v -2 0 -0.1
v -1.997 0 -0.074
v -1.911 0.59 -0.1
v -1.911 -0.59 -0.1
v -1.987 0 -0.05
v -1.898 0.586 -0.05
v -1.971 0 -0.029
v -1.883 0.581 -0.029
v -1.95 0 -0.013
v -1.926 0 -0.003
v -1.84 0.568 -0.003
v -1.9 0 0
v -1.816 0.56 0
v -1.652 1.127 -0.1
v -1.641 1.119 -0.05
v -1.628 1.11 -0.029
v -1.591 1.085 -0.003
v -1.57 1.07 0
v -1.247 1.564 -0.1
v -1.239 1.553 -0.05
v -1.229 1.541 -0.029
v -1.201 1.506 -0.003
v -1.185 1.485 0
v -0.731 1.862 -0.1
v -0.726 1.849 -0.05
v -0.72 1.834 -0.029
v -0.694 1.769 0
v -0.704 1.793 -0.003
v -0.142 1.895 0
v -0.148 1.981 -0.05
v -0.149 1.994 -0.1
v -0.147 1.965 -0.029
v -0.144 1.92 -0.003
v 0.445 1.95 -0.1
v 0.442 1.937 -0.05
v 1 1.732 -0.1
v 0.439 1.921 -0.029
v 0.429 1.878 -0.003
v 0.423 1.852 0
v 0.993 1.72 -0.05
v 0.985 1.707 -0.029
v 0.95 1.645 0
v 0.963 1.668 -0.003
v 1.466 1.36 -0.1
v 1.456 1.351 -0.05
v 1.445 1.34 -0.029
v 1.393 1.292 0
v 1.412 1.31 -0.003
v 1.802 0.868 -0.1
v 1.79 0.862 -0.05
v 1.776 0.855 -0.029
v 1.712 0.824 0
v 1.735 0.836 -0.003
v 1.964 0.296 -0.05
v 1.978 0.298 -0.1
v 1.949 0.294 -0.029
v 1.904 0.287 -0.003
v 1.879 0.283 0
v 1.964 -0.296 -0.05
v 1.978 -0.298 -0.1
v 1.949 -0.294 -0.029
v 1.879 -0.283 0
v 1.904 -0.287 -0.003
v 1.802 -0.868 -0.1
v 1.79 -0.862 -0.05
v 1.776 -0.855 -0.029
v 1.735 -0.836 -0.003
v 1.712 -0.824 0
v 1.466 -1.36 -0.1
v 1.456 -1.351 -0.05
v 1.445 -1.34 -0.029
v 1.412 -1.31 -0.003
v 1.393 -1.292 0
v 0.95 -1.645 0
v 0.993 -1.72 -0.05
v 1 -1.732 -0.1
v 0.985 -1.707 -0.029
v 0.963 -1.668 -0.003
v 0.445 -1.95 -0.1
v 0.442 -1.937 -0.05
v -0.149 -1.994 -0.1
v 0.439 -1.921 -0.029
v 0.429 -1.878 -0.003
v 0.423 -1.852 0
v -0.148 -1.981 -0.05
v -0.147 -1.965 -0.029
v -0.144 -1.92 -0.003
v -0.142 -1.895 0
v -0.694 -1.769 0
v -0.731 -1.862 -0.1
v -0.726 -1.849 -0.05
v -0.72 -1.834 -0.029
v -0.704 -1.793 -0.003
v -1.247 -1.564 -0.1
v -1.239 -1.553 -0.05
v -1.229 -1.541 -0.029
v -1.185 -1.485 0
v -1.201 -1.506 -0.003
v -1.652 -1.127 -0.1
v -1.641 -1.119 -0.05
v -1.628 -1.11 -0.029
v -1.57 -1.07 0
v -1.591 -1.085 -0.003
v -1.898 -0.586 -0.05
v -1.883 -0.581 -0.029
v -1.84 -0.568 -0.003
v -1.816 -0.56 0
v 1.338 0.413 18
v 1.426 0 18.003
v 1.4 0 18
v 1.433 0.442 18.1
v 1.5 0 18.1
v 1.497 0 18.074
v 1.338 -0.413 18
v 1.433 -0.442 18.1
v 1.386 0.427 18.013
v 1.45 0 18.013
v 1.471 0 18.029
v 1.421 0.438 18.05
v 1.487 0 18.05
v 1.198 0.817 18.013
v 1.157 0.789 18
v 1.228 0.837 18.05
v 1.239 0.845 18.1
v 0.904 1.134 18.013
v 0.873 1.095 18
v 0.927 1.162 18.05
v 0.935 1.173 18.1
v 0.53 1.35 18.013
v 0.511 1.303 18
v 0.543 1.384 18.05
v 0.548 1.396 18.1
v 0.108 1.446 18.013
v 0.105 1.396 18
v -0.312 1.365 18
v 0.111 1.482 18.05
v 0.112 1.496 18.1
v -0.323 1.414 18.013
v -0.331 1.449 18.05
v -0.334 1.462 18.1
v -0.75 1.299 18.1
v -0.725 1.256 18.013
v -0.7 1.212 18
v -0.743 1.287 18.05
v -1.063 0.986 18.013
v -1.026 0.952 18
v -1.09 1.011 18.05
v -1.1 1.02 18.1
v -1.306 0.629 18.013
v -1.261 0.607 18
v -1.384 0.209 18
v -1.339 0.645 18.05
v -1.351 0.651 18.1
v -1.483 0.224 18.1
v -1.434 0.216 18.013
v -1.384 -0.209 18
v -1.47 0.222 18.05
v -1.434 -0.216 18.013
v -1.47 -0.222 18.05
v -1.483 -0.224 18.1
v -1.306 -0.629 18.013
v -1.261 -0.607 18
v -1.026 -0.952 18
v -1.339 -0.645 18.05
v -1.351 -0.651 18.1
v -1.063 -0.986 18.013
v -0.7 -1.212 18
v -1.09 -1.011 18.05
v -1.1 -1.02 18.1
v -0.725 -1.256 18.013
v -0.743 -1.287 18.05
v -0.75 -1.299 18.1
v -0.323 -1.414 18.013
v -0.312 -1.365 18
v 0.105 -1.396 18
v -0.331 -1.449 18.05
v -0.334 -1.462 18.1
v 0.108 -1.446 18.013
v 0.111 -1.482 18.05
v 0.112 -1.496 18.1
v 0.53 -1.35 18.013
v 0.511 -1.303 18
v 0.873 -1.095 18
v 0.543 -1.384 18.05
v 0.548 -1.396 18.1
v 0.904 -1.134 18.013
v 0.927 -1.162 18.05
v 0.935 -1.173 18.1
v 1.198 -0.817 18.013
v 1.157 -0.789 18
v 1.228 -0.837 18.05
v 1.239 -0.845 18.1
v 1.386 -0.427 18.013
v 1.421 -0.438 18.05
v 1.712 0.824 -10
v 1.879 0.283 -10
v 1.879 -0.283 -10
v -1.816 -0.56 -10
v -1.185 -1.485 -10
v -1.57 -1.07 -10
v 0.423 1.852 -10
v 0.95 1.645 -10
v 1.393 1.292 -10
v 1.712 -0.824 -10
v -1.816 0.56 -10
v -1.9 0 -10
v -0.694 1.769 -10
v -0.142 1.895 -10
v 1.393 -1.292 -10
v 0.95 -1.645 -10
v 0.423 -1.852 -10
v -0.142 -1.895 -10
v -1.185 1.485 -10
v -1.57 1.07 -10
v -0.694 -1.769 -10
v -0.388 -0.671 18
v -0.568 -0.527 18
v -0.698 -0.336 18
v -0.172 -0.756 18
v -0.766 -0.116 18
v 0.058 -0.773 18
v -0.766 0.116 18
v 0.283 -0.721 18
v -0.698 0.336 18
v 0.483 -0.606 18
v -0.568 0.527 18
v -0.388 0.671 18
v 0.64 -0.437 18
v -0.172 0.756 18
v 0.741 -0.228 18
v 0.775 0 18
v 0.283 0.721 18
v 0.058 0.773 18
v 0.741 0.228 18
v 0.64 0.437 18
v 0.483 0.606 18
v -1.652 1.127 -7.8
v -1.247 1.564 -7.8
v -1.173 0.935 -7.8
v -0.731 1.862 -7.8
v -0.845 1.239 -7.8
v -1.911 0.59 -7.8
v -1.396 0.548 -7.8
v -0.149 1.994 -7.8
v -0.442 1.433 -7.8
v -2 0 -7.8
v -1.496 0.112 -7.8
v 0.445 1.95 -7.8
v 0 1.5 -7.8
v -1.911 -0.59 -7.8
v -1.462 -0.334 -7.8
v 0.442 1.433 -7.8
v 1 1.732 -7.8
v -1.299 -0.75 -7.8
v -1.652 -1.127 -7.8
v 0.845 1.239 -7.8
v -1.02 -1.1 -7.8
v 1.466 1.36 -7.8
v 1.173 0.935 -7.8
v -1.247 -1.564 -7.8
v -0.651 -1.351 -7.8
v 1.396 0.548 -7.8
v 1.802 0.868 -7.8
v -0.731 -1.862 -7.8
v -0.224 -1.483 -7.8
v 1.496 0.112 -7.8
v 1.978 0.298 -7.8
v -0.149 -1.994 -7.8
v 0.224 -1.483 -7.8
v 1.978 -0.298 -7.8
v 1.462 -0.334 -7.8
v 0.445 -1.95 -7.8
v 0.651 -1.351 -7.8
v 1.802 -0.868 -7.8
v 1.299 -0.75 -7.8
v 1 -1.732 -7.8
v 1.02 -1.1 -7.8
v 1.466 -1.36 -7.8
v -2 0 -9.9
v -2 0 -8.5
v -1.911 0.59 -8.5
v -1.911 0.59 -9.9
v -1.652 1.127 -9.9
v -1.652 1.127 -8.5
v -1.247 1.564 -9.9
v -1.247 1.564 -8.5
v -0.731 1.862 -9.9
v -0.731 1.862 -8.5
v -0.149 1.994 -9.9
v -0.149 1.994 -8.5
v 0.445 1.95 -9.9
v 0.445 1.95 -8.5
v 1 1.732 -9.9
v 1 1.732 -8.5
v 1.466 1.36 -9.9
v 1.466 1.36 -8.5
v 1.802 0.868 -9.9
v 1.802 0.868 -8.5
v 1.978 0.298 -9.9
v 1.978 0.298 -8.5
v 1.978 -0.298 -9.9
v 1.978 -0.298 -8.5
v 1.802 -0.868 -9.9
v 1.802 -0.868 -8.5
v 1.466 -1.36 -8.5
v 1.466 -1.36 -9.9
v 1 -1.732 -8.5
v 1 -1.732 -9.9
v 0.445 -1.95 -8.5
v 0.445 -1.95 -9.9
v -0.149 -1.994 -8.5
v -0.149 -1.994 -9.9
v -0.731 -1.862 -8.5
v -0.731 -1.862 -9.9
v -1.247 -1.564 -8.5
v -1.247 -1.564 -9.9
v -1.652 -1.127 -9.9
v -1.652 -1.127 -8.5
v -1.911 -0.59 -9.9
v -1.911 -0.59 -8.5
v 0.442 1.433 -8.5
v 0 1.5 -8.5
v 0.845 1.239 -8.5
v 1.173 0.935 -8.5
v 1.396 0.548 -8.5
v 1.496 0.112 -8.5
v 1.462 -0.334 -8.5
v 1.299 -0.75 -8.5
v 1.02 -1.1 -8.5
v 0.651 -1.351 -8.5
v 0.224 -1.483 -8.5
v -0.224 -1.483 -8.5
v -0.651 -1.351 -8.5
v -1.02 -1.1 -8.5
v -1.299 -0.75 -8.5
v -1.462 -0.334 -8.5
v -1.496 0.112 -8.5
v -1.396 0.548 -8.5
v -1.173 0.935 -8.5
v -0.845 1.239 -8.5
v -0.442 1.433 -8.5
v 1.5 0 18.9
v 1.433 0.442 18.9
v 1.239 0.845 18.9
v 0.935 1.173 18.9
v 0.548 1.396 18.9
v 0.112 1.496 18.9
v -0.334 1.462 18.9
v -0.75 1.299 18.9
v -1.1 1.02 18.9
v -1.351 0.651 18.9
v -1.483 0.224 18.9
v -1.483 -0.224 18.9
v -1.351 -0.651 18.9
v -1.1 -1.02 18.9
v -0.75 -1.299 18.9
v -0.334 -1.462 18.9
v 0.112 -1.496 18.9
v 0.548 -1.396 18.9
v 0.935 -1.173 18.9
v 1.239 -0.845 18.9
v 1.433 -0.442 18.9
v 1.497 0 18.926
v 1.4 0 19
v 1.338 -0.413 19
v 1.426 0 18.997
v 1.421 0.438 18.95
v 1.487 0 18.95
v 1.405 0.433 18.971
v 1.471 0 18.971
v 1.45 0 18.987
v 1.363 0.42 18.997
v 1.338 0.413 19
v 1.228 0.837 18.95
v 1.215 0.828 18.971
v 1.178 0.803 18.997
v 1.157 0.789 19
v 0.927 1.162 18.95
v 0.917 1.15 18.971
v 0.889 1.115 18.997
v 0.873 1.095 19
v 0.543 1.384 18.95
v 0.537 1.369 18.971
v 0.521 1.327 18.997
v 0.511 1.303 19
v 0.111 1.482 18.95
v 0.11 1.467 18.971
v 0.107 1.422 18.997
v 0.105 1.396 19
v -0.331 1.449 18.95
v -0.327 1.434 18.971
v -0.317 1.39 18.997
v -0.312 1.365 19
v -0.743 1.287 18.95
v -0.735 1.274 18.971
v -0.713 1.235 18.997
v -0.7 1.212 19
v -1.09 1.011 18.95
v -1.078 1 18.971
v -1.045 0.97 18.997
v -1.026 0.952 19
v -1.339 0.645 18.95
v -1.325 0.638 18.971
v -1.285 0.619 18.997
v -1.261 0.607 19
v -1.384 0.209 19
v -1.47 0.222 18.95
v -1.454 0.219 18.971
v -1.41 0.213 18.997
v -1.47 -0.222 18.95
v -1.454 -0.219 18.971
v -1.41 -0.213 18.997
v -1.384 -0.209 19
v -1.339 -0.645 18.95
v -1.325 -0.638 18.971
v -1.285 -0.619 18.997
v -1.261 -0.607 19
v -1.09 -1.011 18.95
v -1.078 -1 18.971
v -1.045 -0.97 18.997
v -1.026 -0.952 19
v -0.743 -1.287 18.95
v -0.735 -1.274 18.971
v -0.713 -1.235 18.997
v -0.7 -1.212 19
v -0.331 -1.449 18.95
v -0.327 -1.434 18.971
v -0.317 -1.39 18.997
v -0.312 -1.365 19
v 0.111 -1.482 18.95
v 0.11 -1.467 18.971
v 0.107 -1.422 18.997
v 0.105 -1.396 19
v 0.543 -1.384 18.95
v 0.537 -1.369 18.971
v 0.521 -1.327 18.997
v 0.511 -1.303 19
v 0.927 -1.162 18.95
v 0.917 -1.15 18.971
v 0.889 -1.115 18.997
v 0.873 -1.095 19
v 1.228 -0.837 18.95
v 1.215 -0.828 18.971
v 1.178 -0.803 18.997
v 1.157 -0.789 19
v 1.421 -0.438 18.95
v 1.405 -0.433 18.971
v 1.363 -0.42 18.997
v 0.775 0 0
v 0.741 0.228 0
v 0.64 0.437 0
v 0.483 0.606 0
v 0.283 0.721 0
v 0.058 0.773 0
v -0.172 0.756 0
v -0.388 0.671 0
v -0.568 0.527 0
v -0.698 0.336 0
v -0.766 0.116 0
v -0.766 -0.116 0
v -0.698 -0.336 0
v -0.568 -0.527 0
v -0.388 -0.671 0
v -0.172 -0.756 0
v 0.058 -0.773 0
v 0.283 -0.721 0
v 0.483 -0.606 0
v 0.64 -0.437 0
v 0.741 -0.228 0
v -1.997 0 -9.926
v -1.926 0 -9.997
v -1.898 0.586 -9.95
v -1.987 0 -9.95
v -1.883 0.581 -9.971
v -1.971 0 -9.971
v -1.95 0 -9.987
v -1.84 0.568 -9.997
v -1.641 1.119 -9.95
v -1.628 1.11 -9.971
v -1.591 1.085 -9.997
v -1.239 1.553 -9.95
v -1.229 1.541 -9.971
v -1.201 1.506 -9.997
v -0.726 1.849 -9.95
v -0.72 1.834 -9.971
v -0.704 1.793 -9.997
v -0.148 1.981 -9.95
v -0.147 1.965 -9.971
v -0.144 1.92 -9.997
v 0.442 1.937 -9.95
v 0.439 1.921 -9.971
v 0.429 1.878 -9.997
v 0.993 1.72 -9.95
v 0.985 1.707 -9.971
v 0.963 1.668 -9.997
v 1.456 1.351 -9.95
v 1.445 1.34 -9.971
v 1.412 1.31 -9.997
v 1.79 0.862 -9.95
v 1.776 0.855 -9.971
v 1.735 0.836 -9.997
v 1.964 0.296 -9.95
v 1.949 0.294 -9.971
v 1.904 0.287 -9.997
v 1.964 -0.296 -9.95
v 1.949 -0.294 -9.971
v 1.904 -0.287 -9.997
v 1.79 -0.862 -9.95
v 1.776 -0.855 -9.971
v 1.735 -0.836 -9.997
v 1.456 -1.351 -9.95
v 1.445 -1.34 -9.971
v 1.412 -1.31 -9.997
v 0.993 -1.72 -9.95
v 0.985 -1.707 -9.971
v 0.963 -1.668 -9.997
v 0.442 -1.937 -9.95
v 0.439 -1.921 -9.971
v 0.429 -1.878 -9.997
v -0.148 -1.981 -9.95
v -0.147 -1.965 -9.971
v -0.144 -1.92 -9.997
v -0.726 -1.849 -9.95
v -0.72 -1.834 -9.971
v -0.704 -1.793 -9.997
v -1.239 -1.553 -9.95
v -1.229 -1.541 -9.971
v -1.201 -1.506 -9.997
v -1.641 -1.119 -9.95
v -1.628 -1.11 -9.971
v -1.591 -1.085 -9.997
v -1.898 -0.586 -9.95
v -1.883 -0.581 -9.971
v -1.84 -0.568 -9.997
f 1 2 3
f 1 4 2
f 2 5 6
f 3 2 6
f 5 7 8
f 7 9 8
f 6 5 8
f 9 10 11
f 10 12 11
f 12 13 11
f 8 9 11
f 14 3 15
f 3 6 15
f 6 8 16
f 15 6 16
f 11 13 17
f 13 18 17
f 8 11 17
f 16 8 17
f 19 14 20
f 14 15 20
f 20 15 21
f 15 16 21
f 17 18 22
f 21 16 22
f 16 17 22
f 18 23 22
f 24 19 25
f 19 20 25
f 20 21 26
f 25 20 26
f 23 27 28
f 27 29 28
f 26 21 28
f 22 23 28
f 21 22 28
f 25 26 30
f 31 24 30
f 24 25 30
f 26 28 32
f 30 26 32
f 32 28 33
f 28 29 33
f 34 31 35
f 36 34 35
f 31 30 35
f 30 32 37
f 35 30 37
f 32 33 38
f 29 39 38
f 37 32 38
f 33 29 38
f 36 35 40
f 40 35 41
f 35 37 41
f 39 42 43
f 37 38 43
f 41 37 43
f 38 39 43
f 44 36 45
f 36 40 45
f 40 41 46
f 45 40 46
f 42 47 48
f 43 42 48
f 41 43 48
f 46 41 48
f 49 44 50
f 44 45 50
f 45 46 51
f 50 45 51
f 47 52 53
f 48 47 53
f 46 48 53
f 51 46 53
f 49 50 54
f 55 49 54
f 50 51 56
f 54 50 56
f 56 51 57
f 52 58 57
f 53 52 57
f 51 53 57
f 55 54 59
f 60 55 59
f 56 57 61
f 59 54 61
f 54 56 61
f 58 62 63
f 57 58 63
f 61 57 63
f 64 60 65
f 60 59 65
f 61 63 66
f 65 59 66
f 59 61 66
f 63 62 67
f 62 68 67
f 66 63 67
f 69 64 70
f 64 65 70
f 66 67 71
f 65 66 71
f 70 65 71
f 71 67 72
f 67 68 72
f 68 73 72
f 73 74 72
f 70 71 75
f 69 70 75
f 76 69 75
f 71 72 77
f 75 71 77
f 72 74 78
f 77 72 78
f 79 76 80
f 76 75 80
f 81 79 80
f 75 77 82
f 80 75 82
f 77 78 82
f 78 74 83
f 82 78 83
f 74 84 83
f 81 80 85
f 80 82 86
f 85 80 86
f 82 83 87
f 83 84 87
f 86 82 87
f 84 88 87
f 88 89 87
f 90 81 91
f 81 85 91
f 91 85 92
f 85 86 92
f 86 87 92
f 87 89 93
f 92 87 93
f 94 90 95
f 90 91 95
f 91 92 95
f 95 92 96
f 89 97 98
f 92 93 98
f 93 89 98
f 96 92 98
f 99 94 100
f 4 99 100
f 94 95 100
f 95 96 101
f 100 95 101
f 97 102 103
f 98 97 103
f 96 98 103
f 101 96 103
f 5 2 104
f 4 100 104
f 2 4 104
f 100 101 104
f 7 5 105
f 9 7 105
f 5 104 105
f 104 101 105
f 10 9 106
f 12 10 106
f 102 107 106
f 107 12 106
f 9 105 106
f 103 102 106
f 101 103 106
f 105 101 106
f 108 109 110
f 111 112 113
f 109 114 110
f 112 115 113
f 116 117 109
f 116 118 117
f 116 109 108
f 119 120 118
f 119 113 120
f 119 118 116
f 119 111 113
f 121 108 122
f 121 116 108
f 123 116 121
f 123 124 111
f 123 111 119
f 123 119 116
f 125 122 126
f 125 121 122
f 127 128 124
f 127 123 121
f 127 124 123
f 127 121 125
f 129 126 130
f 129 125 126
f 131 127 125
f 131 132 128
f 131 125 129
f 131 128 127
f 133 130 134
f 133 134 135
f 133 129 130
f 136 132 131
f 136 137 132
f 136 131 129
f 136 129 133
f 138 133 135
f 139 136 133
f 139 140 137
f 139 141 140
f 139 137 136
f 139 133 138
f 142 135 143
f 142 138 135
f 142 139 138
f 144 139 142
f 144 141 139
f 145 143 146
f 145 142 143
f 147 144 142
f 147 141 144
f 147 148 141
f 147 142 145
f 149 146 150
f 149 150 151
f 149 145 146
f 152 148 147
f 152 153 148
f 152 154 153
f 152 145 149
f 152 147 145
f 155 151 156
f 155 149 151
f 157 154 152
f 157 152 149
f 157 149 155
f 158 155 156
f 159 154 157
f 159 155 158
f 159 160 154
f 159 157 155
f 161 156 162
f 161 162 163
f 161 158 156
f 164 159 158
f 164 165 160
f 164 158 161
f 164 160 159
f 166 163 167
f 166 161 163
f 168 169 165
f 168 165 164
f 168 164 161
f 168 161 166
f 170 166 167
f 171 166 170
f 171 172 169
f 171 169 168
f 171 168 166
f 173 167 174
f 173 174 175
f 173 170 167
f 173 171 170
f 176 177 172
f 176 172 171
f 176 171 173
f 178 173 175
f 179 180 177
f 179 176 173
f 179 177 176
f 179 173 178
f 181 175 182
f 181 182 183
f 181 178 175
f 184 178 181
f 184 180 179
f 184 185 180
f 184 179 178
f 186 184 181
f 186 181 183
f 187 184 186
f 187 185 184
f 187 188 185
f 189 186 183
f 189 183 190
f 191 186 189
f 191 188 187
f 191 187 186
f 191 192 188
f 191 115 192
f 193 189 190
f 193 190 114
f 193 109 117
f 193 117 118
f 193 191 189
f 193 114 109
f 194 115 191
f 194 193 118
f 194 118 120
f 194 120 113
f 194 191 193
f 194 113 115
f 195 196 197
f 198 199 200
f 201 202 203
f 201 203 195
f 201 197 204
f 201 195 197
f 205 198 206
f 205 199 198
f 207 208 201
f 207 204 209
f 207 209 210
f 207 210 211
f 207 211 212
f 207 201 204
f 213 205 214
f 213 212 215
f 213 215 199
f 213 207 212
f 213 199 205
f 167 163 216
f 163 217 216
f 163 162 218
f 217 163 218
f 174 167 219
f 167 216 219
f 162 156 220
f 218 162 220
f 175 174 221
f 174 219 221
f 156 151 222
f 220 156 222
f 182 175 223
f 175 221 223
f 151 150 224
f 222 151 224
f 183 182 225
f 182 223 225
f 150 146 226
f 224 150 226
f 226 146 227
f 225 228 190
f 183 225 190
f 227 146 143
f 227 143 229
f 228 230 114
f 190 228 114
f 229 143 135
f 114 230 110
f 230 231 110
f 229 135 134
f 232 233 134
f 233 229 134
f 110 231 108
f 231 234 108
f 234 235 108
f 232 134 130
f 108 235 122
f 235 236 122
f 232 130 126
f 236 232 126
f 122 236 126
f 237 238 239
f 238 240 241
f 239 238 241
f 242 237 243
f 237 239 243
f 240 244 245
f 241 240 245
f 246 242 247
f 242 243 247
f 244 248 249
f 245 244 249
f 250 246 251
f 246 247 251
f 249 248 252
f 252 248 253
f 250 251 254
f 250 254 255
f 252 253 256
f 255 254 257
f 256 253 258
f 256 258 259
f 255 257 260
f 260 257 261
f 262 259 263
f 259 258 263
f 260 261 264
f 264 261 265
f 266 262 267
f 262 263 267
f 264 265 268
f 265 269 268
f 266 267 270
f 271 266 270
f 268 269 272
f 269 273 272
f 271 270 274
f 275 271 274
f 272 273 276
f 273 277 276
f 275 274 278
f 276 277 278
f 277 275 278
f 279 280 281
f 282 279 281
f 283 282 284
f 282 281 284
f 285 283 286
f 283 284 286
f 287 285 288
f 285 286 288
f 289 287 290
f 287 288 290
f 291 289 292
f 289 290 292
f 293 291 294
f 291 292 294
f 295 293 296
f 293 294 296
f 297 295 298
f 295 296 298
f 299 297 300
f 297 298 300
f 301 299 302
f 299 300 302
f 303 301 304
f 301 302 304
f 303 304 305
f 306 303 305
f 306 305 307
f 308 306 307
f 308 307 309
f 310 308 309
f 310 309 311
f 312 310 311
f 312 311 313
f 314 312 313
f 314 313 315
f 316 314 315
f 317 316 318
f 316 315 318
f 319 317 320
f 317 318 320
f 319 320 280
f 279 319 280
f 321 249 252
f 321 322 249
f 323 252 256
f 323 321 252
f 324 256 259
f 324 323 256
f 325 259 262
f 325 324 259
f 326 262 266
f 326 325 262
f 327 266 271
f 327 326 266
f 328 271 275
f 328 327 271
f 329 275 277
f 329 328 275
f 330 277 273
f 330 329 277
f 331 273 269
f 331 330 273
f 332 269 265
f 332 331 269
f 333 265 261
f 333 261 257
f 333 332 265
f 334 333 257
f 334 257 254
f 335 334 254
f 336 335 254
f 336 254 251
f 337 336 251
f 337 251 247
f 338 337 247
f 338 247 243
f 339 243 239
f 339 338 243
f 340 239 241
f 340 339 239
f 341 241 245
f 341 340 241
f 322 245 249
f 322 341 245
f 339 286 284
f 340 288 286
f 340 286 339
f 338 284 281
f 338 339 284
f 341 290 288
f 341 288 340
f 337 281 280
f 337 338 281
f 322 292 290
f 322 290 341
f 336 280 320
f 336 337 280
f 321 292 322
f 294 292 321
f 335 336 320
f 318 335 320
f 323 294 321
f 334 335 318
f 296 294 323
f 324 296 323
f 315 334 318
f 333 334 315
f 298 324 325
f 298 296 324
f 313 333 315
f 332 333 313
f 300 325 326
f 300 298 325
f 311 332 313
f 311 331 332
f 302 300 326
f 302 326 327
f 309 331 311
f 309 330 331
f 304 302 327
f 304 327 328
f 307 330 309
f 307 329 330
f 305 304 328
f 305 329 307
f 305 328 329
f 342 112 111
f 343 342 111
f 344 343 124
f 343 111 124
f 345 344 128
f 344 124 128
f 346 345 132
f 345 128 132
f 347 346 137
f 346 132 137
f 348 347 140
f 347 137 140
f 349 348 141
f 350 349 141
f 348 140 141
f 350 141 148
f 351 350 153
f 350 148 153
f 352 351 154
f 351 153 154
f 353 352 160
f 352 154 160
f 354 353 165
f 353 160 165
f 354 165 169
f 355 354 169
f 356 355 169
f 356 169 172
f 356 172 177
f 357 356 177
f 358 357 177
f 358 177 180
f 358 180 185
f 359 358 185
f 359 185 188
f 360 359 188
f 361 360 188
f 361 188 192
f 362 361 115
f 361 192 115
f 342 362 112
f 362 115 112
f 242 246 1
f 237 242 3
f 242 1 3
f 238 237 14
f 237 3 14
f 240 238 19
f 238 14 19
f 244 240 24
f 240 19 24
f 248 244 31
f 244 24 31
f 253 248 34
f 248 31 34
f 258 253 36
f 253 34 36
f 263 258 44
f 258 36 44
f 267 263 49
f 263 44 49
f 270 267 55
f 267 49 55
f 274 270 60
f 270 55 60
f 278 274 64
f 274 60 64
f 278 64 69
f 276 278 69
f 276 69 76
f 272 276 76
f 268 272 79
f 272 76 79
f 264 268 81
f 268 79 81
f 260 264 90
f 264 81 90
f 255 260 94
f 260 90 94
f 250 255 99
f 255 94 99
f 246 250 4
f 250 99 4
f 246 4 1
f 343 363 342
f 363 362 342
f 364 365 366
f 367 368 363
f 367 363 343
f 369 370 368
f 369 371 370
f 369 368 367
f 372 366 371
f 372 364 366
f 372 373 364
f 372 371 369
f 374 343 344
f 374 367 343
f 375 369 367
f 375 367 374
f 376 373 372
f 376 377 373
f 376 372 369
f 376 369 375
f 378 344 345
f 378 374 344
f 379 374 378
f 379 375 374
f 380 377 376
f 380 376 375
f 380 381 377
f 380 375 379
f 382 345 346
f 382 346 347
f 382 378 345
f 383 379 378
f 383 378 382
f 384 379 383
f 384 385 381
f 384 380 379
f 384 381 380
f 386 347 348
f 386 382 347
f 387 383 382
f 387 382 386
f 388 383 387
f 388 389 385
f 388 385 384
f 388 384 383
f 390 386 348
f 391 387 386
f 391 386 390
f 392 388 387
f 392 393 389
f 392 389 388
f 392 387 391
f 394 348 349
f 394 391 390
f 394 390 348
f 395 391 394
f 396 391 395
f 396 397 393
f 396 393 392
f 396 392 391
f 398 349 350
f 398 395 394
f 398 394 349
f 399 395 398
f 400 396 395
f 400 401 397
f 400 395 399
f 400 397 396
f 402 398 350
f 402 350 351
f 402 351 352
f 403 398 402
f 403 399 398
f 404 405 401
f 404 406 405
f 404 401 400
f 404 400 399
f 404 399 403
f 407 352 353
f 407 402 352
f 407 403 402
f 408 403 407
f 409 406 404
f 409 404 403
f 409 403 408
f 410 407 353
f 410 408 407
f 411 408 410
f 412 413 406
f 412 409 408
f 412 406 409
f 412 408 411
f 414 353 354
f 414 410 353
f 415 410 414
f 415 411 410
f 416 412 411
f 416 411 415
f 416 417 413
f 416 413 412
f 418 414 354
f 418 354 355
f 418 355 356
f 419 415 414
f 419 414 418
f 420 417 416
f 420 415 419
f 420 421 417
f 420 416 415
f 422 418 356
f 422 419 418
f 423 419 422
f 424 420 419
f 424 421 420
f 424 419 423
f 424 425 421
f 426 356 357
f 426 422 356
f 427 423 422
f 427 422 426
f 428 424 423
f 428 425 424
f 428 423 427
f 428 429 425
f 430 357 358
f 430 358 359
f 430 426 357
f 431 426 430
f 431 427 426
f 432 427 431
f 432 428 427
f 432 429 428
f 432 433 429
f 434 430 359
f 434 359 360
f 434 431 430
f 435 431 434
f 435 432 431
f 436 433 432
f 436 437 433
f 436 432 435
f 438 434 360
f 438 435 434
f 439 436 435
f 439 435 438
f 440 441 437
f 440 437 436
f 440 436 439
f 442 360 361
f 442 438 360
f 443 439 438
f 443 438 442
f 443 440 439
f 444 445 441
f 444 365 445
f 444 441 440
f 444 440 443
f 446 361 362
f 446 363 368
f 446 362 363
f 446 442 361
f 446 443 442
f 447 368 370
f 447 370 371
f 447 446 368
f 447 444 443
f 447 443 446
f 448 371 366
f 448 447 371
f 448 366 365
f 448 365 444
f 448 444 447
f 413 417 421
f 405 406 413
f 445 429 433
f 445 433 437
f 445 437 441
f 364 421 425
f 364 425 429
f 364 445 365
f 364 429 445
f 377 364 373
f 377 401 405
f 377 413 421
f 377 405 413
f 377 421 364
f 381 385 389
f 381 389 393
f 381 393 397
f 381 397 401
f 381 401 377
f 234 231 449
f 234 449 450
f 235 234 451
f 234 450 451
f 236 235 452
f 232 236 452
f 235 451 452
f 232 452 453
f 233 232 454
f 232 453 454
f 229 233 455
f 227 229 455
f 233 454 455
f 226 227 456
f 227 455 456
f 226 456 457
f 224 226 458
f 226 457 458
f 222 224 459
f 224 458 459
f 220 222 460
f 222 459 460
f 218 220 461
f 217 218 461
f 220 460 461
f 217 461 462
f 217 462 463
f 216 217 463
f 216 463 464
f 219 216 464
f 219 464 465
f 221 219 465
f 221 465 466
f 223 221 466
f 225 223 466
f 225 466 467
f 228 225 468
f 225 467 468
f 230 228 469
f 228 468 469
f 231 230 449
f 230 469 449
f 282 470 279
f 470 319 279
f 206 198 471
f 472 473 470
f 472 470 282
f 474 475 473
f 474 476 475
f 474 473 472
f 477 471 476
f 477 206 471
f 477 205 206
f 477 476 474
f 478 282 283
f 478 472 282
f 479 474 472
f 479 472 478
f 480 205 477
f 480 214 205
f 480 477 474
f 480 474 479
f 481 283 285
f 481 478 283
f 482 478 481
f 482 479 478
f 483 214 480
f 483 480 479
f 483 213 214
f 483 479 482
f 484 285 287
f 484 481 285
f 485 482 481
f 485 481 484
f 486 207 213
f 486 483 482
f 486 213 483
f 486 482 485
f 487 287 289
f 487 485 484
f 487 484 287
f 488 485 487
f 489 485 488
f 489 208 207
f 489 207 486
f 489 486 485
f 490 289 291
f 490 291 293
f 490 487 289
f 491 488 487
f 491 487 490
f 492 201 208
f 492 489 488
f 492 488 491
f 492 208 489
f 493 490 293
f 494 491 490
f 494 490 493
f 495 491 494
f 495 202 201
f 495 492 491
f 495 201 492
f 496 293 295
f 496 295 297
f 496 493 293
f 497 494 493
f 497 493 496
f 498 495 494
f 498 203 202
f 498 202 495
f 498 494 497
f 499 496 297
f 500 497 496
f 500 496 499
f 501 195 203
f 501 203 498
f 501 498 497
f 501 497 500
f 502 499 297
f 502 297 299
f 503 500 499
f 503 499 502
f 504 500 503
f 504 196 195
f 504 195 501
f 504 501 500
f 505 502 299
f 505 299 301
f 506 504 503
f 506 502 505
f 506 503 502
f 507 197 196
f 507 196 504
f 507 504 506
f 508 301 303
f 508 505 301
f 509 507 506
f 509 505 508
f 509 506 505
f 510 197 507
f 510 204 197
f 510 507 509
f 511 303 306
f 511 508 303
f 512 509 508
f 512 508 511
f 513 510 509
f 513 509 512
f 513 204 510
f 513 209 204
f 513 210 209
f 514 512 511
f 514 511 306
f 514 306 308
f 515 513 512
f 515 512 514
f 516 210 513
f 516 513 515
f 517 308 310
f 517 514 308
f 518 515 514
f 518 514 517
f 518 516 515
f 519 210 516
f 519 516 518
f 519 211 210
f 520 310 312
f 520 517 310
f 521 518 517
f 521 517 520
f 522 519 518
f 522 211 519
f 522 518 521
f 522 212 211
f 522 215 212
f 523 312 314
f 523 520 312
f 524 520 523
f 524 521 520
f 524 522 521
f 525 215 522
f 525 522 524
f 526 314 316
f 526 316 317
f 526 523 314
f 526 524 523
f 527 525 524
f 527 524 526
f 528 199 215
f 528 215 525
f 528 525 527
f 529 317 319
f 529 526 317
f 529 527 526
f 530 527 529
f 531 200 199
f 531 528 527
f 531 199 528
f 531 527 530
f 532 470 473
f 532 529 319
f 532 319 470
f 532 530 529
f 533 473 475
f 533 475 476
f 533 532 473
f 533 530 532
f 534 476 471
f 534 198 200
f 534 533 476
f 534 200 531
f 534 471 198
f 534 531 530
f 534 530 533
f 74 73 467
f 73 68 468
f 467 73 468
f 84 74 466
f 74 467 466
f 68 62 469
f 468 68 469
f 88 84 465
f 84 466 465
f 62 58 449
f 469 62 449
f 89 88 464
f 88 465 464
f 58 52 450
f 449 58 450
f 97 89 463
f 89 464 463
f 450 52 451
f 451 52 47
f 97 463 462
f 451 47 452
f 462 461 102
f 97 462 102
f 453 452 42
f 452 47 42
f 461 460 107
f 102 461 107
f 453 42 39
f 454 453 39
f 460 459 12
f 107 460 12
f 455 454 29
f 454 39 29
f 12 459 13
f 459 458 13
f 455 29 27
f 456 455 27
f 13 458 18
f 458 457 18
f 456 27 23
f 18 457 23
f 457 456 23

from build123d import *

# Parameters (mm, degrees)
SKETCH1_R           = 0.775
BOSS_EXTRUDE1_DEPTH = 18
SKETCH2_R           = 1.5
BOSS_EXTRUDE2_DEPTH = 1
SKETCH3_R           = 2
BOSS_EXTRUDE4_DEPTH = 10
SKETCH5_W           = 0.7
SKETCH5_H           = 0.5
FILLET1_R           = 0.1


with BuildPart() as part:
    # Sketch1 → Boss-Extrude1 (new body)
    with BuildSketch(Plane.XY):
        Circle(SKETCH1_R)
    extrude(amount=BOSS_EXTRUDE1_DEPTH)

    # Sketch2 → Boss-Extrude2 (add)
    with BuildSketch(Plane.XY.offset(18)):
        Circle(SKETCH2_R)
    extrude(amount=BOSS_EXTRUDE2_DEPTH)

    # Sketch3 → Boss-Extrude4 (add)
    with BuildSketch(Plane(origin=(0, 0, 0), x_dir=(-1, 0, 0), z_dir=(0, 0, -1))):
        Circle(SKETCH3_R)
    extrude(amount=BOSS_EXTRUDE4_DEPTH)

    # Sketch5 → Cut-Revolve1 (revolve, cut)
    with BuildSketch(Plane(origin=(0, 0, 0), x_dir=(0, 0, -1), z_dir=(1, 0, 0))):
        with Locations((8.15, 1.75)):
            Rectangle(SKETCH5_W, SKETCH5_H)
    revolve(axis=Axis((0, 0, 0), (0, 0, -1)), mode=Mode.SUBTRACT)

    # Fillet1
    fillet1_edges = [part.edges().sort_by_distance(p)[0] for p in [
        (-1.5, 0, 18),
        (-1.5, 0, 19),
        (2, 0, 0),
        (2, 0, -10),
    ]]
    fillet(fillet1_edges, radius=FILLET1_R)


solid = part.part
